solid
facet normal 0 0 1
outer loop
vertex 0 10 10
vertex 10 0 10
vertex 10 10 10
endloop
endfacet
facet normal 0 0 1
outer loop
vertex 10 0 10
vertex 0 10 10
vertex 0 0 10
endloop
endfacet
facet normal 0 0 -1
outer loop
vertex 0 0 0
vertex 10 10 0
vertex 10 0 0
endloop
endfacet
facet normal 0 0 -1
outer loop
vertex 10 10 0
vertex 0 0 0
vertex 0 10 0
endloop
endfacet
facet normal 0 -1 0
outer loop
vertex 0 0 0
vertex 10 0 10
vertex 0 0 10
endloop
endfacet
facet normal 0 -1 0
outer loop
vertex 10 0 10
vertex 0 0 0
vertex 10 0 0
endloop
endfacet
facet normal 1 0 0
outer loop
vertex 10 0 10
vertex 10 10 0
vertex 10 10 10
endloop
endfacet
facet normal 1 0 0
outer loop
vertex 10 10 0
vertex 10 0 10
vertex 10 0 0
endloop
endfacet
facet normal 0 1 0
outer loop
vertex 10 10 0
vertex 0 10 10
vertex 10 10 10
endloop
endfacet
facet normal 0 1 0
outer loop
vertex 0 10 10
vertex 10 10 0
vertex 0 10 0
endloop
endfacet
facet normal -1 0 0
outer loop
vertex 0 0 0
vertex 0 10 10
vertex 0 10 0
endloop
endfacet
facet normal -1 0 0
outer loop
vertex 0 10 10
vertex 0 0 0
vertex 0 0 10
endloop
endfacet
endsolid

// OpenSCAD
// example.scad
// A simple 3D model of a cube

cube([10, 10, 10]);
